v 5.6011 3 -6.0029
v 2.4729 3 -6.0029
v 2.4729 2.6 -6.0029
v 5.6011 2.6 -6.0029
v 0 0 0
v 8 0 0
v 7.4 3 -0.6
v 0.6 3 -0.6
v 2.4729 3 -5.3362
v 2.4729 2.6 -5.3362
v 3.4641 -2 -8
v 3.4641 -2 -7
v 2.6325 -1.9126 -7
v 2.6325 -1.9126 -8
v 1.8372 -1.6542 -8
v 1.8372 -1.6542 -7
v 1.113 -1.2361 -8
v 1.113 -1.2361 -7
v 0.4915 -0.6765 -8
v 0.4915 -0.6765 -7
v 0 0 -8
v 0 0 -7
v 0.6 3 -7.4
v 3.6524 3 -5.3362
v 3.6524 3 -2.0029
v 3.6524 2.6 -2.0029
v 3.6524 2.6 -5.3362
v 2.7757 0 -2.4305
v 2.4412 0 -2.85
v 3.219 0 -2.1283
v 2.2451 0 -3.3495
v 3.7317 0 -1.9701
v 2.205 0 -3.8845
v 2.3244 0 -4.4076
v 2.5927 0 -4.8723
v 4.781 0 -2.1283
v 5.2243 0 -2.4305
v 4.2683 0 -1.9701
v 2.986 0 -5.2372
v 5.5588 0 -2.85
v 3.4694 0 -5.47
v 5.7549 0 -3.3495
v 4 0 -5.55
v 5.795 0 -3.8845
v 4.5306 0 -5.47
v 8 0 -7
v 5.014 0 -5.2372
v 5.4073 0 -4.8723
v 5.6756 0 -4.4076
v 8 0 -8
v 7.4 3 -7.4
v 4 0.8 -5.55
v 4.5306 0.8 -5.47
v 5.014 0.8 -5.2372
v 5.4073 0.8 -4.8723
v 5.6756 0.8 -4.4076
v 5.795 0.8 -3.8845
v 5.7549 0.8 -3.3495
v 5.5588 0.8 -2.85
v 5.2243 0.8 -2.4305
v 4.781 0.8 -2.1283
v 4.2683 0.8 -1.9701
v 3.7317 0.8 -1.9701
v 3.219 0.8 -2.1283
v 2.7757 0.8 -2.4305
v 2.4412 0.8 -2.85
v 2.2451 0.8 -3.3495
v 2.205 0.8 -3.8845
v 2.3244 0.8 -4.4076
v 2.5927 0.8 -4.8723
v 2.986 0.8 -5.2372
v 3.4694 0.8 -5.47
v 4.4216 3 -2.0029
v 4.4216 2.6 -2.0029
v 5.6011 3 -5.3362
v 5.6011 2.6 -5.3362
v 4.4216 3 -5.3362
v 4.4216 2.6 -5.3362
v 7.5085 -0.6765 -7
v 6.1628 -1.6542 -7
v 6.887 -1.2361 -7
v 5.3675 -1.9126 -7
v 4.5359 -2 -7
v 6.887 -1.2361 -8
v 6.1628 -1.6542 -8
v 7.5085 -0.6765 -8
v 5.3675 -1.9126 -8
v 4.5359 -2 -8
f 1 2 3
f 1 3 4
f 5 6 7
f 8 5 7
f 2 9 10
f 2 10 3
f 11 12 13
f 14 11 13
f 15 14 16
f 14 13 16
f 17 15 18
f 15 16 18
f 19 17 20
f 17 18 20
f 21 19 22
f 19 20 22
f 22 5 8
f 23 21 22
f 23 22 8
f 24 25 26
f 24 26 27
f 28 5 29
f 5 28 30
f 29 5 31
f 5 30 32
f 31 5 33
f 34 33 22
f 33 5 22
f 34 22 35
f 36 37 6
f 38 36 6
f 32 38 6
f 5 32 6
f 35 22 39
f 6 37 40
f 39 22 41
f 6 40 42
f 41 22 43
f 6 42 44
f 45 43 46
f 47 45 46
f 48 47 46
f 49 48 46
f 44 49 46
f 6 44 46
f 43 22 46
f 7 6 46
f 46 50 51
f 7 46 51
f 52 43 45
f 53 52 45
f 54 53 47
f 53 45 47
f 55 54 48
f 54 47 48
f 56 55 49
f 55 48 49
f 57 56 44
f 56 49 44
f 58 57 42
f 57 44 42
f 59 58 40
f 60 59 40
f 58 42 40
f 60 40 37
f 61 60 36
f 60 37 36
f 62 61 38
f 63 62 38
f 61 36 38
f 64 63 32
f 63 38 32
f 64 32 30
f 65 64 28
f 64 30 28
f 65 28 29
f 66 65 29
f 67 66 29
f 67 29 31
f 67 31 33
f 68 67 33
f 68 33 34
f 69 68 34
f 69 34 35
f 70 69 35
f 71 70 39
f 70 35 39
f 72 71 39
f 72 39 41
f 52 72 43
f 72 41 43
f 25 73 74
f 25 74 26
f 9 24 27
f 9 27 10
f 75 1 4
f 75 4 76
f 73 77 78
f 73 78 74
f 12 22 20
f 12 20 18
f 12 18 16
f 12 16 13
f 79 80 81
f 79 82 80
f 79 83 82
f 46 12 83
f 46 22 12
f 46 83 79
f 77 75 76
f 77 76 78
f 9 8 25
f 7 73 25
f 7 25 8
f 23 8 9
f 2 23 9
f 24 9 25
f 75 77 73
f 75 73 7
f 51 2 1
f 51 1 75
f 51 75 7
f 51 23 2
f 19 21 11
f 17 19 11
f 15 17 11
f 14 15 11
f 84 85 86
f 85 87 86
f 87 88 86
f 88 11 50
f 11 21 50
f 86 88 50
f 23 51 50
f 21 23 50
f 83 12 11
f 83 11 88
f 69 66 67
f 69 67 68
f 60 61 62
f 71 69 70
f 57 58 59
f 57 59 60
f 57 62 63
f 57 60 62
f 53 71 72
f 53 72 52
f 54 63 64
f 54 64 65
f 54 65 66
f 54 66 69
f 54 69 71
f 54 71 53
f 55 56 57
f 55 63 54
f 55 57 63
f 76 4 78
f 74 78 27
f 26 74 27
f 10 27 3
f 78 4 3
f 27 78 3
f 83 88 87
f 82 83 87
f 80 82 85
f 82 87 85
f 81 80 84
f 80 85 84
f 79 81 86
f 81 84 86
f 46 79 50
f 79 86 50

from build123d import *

# Parameters (mm, degrees)
SKETCH1_W               = 8
SKETCH1_H               = 8
BOSS_EXTRUDE1_DEPTH     = 3
CUT_EXTRUDE1_DEPTH      = 12.704699911
CUT_EXTRUDE1_DEPTH_BACK = 12.704699911
CUT_EXTRUDE2_DEPTH      = 11
SKETCH4_R               = 1.8
CUT_EXTRUDE3_DEPTH      = 0.8
SKETCH5_W               = 8
SKETCH5_H               = 1
BOSS_EXTRUDE2_DEPTH     = 2
FILLET1_R               = 4
CUT_EXTRUDE4_DEPTH      = 0.4


with BuildPart() as part:
    # Sketch1 → Boss-Extrude1 (new body)
    with BuildSketch(Plane(origin=(0, 0, 0), x_dir=(1, 0, 0), z_dir=(0, 1, 0))):
        with Locations((4, 4)):
            Rectangle(SKETCH1_W, SKETCH1_H)
    extrude(amount=BOSS_EXTRUDE1_DEPTH)

    # Sketch2 → Cut-Extrude1 (cut, two sides: drawn at the far end of the back side and taken through both)
    with BuildSketch(Plane.XY.offset(-CUT_EXTRUDE1_DEPTH_BACK)):
        Polygon((0, 0), (0.6, 3), (0, 3), align=None)
        Polygon((8, 0), (7.4, 3), (8, 3), align=None)
    extrude(amount=CUT_EXTRUDE1_DEPTH + CUT_EXTRUDE1_DEPTH_BACK, mode=Mode.SUBTRACT)

    # Sketch3 → Cut-Extrude2 (cut)
    with BuildSketch(Plane(origin=(0, 0, 0), x_dir=(0, 0, -1), z_dir=(1, 0, 0))):
        Polygon((0, 0), (0.6, 3), (0, 3), align=None)
        Polygon((8, 3), (7.4, 3), (8, 0), align=None)
    extrude(amount=CUT_EXTRUDE2_DEPTH, mode=Mode.SUBTRACT)

    # Sketch4 → Cut-Extrude3 (cut)
    with BuildSketch(Plane.XZ):
        with Locations(Location((4, -3.75, 0), (0, 0, 270))):
            Circle(SKETCH4_R)
    extrude(amount=-CUT_EXTRUDE3_DEPTH, mode=Mode.SUBTRACT)

    # Sketch5 → Boss-Extrude2 (add)
    with BuildSketch(Plane.XZ):
        with Locations((4, -7.5)):
            Rectangle(SKETCH5_W, SKETCH5_H)
    extrude(amount=BOSS_EXTRUDE2_DEPTH)

    # Fillet1
    # the kernel refuses this fillet: 4 mm, written as the material it takes off along each edge
    with BuildSketch(Plane(origin=(8, -2, -16.660254038), x_dir=(0, 1, 0), z_dir=(0, 0, 1)), Plane(origin=(0, -2, 1.660254038), x_dir=(0, 1, 0), z_dir=(0, 0, -1))) as fillet1_piece_1:
        with BuildLine():
            CenterArc((4, 3.464101615), FILLET1_R, 180, 60)
            Line((0, 3.464101615), (-0.08, 3.464101615))
            Line((-0.08, 3.464101615), (-0.08, 0))
            Line((-0.08, 0), (0, -0.08))
            ThreePointArc((0, -0.08), (1, -0.08), (1.96, -0.069282032))
            Line((1.96, -0.069282032), (2, 0))
        make_face()
    extrude(amount=18.320508076, mode=Mode.SUBTRACT)

    # Sketch6 → Cut-Extrude4 (cut)
    with BuildSketch(Plane(origin=(0, 3, 0), x_dir=(1, 0, 0), z_dir=(0, 1, 0))):
        Polygon((3.652362984, 2.002856352), (3.652362984, 5.336189685), (2.472875805, 5.336189685), (2.472875805, 6.002856352), (5.601080933, 6.002856352), (5.601080933, 5.336189685), (4.421593754, 5.336189685), (4.421593754, 2.002856352), align=None)
    extrude(amount=-CUT_EXTRUDE4_DEPTH, mode=Mode.SUBTRACT)


solid = part.part
